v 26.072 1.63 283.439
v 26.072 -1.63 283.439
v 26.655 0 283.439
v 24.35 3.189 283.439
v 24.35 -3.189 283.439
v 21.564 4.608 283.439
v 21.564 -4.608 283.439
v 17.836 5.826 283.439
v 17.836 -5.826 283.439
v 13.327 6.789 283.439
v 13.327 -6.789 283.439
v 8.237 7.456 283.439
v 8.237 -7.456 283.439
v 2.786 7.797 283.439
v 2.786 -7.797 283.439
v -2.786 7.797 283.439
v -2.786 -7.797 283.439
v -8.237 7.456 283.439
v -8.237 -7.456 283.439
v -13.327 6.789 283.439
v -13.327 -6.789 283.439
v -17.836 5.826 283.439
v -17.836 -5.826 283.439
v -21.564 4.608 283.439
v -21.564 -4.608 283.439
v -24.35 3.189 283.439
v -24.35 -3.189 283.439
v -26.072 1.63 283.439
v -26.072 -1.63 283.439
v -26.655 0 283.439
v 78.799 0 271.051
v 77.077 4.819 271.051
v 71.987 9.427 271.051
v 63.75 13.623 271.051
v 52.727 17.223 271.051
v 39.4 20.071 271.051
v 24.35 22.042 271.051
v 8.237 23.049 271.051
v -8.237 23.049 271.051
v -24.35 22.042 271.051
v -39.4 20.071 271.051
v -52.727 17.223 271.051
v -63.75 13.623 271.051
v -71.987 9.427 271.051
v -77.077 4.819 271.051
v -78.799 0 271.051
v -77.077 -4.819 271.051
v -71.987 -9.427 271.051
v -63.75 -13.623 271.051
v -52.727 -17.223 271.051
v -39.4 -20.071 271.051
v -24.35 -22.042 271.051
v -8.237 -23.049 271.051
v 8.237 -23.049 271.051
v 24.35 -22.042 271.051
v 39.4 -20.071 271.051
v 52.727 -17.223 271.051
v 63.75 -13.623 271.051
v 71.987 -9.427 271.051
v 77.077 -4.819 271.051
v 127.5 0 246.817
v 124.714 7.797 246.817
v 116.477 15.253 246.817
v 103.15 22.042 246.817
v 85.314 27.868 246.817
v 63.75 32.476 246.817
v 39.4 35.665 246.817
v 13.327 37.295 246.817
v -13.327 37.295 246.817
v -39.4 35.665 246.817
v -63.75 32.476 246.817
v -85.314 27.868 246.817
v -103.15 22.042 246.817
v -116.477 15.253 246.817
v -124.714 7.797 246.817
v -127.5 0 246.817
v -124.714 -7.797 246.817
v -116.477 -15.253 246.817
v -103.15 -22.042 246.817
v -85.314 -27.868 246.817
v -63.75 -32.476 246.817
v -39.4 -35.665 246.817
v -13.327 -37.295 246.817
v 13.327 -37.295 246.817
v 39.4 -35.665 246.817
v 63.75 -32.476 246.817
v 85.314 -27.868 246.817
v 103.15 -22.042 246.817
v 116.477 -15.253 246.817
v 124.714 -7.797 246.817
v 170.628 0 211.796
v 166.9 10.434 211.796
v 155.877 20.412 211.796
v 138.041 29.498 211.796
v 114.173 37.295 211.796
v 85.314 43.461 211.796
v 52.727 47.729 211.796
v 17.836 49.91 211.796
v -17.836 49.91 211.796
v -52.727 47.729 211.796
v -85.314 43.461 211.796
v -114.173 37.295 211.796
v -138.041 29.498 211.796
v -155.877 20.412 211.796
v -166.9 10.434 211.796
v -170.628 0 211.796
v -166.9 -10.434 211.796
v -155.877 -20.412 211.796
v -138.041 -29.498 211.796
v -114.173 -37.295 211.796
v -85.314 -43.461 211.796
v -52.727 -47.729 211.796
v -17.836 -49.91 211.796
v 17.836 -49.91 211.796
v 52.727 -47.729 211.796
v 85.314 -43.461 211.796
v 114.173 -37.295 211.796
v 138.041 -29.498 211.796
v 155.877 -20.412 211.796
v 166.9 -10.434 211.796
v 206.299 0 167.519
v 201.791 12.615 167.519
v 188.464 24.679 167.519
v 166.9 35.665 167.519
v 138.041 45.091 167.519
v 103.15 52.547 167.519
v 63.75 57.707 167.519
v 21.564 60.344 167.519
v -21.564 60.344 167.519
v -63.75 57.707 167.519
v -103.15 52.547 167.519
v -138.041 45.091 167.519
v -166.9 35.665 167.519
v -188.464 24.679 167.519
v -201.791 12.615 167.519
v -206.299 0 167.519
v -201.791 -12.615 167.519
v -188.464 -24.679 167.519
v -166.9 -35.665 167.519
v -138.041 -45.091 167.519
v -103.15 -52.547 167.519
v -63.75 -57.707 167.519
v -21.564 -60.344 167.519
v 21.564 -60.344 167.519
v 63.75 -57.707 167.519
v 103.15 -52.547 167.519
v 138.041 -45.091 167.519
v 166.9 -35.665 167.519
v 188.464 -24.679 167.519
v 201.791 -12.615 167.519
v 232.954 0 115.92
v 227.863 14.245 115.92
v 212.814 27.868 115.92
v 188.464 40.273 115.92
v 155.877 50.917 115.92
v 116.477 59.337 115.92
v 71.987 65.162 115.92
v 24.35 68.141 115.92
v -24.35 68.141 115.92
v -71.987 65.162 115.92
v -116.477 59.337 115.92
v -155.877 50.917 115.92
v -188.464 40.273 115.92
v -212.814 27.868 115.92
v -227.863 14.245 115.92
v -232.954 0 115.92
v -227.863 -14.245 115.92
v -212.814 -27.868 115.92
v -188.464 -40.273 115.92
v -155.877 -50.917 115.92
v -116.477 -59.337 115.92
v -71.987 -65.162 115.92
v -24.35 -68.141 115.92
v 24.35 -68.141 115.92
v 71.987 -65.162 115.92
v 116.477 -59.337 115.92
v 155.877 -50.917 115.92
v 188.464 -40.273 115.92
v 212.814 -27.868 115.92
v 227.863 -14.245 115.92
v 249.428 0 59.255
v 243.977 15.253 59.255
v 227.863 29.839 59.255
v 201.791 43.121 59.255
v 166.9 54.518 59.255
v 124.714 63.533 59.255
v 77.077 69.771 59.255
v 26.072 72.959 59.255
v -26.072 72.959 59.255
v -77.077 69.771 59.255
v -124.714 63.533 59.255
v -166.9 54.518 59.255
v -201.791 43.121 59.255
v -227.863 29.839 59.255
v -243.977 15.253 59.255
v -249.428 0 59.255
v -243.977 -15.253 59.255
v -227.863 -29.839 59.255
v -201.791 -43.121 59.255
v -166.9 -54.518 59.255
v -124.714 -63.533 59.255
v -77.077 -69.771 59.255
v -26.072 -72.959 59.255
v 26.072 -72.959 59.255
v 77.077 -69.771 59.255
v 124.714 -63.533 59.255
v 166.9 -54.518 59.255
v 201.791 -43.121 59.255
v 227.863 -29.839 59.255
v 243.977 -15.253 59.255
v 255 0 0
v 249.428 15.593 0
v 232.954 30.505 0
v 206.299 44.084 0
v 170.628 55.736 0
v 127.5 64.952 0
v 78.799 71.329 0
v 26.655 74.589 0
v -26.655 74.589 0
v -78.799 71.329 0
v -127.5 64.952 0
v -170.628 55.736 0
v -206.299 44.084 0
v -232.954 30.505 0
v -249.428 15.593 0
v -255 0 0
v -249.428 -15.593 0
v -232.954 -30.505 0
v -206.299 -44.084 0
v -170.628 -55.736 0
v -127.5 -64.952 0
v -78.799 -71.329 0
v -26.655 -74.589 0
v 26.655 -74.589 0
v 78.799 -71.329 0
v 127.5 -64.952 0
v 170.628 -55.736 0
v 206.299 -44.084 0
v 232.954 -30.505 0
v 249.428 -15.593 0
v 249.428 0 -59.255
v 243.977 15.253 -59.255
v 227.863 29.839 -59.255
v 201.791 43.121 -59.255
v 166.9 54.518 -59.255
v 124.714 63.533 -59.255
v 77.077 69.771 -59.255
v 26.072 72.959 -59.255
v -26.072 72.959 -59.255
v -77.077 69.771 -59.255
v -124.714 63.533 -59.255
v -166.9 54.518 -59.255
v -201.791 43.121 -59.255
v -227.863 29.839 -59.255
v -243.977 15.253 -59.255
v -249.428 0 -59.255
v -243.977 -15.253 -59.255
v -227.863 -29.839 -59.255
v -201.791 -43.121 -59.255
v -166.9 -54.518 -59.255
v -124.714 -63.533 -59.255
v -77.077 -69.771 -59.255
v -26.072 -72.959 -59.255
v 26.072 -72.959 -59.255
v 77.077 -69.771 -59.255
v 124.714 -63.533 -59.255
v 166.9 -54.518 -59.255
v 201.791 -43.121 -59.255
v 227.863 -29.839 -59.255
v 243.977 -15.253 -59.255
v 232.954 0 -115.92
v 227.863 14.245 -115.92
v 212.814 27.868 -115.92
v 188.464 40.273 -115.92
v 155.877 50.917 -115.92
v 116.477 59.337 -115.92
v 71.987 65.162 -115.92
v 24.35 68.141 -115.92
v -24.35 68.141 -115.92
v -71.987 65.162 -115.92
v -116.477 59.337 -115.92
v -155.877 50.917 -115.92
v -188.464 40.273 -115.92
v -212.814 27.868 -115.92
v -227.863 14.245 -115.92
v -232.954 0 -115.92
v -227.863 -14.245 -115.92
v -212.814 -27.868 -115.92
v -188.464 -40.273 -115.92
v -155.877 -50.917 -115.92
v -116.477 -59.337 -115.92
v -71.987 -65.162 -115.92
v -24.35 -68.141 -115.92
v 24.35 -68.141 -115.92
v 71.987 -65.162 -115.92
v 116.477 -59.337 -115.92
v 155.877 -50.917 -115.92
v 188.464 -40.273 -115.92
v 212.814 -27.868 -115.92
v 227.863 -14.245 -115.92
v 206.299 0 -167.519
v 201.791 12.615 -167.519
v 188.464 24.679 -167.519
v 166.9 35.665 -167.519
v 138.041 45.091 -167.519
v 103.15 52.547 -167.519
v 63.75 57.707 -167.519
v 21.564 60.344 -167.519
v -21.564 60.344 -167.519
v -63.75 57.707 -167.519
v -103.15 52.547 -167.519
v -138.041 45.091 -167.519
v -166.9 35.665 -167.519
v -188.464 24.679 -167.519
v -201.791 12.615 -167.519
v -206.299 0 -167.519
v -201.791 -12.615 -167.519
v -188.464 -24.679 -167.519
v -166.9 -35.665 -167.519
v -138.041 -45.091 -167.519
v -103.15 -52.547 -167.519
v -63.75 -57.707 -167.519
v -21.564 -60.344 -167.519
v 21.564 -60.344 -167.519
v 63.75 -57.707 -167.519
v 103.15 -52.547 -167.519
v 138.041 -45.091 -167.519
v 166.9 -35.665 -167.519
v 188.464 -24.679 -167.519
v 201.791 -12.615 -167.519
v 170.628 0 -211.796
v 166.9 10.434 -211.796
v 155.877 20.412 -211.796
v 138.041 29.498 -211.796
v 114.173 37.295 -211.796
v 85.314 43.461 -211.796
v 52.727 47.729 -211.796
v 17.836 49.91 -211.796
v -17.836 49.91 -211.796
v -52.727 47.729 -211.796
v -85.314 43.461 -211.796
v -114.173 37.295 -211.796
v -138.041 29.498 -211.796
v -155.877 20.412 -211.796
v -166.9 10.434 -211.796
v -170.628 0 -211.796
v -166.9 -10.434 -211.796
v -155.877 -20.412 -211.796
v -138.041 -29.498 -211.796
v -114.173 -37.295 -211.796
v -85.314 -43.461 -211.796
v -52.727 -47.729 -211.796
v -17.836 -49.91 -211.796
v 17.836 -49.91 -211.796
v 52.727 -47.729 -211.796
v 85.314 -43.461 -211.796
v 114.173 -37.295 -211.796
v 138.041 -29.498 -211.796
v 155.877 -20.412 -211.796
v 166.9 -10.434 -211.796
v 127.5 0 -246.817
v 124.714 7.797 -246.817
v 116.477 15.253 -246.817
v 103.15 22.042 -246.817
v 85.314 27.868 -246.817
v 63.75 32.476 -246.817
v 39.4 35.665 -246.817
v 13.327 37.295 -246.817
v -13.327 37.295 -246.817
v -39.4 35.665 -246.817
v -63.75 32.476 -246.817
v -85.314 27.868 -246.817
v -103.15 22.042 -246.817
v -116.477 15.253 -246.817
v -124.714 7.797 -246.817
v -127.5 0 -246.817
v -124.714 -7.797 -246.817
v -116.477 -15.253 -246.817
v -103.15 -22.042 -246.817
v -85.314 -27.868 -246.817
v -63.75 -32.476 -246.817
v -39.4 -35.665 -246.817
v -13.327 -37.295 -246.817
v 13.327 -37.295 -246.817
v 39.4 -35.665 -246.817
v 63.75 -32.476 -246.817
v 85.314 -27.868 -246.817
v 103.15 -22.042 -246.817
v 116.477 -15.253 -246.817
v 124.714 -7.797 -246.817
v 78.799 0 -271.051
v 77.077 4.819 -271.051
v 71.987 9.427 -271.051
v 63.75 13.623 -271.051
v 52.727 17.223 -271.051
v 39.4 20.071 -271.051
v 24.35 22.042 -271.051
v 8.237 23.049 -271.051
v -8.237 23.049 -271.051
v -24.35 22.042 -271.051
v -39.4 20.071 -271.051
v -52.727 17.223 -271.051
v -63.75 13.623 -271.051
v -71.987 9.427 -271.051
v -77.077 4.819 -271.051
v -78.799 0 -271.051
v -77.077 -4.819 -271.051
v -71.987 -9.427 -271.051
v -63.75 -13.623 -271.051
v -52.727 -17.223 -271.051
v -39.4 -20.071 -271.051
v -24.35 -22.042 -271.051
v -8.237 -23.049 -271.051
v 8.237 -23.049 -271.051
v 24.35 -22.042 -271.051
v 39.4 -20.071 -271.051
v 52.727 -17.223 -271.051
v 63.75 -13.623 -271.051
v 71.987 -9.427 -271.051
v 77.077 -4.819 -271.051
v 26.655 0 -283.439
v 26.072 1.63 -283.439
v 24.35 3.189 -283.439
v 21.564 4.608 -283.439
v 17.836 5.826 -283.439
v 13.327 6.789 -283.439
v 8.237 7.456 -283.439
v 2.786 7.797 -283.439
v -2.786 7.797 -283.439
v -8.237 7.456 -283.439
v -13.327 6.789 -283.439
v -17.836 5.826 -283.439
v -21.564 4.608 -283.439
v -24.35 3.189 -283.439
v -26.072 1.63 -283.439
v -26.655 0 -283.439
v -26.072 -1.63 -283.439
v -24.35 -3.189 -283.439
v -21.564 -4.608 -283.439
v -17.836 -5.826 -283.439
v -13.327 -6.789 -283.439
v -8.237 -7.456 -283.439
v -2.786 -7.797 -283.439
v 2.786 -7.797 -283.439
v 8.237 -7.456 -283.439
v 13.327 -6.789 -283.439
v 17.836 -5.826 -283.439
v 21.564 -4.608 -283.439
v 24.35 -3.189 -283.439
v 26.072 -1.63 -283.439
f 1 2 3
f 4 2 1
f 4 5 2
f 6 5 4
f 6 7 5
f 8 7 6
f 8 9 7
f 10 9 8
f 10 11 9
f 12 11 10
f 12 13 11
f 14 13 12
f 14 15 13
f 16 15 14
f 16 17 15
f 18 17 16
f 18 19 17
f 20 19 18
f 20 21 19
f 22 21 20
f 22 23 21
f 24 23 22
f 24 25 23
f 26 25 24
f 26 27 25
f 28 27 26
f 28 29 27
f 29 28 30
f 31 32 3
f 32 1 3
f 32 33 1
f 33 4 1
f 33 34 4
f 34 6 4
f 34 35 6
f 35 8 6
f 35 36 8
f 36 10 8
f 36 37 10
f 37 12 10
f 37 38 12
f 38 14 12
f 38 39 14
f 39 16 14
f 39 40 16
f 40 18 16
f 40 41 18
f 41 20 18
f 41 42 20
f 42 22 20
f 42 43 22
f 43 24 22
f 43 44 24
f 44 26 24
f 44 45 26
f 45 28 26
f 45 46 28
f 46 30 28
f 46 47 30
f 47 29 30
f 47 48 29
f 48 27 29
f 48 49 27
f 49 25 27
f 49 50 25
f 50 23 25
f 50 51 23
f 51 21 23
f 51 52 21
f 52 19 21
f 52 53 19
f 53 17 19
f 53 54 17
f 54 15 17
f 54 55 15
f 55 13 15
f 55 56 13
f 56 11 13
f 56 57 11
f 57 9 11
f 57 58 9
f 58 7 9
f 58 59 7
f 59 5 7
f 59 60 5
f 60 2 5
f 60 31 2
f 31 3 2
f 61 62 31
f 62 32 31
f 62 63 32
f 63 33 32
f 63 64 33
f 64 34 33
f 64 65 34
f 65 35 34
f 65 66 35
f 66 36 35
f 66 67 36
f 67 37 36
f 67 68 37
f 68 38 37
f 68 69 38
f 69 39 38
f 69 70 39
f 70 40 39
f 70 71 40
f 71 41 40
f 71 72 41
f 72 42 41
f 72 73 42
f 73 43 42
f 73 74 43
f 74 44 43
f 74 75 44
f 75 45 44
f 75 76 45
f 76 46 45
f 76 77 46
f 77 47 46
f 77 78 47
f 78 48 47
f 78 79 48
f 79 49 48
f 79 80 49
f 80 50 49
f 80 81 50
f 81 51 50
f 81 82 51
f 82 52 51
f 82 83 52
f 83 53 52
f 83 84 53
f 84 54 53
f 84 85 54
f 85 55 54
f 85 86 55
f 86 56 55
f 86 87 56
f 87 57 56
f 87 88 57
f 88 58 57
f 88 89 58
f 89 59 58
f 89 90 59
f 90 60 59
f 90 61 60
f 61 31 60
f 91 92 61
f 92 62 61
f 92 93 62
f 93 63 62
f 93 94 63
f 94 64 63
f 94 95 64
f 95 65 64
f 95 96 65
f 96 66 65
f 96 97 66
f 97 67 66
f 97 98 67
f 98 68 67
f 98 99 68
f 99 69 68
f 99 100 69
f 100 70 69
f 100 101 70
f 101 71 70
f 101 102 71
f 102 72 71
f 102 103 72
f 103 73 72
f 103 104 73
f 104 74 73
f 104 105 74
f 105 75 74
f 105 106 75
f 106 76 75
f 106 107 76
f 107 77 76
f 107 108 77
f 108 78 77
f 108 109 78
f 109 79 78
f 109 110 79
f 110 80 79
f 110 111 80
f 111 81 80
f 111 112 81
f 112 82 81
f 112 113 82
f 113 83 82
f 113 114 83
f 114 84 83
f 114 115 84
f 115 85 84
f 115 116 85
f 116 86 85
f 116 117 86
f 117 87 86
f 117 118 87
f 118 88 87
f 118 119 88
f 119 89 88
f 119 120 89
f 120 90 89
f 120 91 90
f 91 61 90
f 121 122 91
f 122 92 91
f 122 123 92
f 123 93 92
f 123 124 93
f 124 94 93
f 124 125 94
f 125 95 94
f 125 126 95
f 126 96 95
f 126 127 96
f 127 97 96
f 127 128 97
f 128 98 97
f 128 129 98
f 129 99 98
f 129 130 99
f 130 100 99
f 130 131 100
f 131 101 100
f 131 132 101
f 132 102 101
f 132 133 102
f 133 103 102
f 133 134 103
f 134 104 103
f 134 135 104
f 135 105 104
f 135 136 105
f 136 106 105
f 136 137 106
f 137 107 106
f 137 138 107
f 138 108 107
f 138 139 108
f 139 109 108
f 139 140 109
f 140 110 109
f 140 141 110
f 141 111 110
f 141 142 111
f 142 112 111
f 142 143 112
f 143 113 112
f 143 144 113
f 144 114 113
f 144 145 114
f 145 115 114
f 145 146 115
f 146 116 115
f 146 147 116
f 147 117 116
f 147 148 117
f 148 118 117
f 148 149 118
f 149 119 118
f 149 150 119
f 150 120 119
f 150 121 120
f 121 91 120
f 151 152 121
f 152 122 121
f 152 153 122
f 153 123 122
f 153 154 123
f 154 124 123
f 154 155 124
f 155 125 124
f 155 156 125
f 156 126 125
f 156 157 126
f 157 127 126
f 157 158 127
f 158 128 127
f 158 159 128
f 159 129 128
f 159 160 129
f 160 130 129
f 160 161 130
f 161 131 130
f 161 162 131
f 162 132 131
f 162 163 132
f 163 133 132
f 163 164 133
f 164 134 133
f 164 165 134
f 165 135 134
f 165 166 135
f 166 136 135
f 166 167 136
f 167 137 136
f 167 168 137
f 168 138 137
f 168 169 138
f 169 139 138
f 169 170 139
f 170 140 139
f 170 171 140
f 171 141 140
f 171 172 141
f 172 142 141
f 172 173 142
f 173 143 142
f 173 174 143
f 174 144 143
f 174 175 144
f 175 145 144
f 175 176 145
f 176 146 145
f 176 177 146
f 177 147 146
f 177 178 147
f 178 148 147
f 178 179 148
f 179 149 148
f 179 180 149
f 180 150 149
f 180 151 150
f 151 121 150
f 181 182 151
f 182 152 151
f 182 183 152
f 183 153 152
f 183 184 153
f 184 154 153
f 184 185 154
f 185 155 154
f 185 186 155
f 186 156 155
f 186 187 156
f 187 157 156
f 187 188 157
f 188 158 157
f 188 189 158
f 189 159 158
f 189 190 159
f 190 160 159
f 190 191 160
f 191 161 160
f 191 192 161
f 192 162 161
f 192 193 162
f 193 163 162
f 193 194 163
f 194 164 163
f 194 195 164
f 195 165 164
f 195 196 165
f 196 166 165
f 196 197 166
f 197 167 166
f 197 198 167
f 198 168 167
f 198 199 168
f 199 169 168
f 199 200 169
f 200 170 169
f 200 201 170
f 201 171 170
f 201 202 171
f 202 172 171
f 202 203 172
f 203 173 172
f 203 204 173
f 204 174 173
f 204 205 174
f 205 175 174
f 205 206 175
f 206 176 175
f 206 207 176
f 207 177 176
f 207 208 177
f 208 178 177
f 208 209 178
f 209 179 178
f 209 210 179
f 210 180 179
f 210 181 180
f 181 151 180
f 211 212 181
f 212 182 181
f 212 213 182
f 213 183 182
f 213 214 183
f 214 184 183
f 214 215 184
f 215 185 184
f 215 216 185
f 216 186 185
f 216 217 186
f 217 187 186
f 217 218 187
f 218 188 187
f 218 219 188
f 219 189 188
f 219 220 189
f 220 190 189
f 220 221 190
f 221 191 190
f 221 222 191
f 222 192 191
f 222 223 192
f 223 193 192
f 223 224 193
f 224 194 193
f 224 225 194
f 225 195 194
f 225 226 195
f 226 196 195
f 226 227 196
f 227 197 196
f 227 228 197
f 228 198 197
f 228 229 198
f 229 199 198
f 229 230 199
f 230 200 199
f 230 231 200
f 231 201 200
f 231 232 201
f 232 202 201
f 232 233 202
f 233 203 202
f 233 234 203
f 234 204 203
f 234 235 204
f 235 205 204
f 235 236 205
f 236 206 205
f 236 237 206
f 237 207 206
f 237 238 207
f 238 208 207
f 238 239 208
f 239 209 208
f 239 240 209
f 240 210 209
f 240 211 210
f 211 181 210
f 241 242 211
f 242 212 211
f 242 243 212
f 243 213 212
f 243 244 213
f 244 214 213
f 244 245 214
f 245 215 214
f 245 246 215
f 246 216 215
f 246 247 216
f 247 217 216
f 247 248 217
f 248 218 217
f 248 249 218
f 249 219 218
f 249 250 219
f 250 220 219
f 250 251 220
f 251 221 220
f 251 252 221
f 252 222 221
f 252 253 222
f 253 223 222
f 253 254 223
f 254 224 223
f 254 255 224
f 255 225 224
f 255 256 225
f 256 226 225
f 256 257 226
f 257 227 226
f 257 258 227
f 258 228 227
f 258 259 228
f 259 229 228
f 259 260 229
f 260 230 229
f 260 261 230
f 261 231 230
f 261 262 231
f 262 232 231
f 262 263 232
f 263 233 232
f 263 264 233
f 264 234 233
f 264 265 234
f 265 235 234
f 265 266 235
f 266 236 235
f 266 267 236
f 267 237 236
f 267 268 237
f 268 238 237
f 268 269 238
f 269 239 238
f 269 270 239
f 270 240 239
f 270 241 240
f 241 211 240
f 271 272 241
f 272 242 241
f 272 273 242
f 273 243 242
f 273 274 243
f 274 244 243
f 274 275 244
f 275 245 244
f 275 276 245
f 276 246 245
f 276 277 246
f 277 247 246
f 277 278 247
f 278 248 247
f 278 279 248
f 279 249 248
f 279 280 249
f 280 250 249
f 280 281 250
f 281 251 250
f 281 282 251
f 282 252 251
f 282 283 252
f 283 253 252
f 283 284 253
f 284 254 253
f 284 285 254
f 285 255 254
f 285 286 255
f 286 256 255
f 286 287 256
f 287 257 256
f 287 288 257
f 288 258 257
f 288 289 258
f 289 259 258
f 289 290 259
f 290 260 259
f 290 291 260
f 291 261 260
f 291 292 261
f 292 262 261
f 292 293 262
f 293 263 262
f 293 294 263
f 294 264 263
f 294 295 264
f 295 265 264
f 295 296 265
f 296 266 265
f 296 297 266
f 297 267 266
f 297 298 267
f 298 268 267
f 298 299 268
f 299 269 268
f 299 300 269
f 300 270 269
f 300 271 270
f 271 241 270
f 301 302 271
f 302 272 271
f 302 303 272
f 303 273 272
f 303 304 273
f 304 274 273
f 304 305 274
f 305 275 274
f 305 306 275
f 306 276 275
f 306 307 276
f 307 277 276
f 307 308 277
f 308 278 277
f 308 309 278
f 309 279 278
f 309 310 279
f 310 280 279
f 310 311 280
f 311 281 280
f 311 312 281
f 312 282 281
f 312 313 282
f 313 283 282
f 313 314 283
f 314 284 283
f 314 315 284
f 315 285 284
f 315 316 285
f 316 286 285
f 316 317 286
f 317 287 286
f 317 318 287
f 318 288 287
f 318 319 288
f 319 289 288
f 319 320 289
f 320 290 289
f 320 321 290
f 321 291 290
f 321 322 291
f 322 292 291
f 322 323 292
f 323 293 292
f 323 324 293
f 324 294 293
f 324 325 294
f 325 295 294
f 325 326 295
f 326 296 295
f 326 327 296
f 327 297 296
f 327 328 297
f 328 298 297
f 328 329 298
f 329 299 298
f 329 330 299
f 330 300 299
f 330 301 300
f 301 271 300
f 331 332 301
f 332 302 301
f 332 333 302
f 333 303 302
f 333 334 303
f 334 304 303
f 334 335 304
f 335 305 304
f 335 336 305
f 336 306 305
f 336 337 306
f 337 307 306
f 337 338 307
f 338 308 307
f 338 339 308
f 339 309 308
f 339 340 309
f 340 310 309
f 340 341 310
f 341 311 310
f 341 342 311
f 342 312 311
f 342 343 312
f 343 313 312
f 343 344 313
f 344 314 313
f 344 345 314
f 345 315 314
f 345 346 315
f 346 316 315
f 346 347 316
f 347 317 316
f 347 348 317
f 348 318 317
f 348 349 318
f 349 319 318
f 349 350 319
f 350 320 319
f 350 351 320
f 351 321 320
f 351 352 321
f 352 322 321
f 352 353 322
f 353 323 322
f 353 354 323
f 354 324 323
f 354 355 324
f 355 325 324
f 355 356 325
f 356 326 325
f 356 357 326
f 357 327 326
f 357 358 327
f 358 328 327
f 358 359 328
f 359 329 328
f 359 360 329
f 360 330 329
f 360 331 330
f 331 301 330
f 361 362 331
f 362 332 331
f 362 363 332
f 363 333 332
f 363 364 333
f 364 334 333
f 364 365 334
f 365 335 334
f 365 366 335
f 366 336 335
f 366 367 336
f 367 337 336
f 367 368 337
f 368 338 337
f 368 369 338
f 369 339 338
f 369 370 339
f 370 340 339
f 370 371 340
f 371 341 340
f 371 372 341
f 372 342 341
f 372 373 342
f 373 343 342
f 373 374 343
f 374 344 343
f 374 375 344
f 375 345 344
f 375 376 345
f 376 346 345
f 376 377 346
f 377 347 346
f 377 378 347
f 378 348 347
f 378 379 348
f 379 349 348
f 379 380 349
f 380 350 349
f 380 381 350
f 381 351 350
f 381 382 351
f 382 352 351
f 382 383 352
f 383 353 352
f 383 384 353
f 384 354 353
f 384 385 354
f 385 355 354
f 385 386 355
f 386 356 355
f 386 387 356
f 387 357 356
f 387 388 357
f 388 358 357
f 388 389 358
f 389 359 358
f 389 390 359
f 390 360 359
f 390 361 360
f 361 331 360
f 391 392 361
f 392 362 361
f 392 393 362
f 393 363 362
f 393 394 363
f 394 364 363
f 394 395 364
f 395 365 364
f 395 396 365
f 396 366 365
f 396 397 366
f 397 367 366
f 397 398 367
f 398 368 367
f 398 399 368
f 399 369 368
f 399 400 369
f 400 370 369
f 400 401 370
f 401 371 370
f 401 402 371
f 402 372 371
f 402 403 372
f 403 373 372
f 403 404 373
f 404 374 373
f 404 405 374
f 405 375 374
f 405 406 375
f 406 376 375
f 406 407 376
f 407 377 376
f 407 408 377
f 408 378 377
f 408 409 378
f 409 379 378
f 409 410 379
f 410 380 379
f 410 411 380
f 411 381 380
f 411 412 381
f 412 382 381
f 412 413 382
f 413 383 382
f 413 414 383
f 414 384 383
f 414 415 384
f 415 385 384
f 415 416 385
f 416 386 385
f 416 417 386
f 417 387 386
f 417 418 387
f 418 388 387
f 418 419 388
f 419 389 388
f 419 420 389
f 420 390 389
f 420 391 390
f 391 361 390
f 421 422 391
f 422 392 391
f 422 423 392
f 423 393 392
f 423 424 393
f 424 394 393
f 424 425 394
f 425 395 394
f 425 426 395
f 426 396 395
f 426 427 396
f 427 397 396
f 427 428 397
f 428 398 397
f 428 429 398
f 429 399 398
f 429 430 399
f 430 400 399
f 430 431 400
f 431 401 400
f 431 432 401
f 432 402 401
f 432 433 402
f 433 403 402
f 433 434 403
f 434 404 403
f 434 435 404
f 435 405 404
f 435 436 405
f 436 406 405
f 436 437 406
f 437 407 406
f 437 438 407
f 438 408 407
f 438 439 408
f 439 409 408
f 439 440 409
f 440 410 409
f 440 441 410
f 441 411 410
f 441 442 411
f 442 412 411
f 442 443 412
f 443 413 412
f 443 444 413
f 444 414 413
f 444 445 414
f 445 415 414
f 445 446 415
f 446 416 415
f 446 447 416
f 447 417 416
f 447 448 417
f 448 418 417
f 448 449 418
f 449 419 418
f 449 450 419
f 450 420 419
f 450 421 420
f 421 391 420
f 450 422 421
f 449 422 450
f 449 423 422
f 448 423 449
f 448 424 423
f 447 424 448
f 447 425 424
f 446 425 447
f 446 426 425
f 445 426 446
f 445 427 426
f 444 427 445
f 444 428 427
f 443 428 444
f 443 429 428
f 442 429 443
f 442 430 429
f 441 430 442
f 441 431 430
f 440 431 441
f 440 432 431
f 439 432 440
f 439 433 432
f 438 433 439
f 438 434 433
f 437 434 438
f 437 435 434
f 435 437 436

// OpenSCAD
// Generated by SolidPython 1.0.1 on 2020-07-29 00:46:52


scale(v = [17, 5, 19]) {
	sphere(r = 15);
}
/***********************************************
*********      SolidPython code:      **********
************************************************
 
# import packages: SolidPython
from solid import *
from solid.utils import *
from itertools import chain, combinations, permutations


class Resize:

    def __init__(self, scad_file):
        self.scad_file = scad_file
        #self.scad_file = import_scad(scad_file)
        # cone/cylinder param:
        self.r1 = 0
        self.r2 = 0
        self.h = 0
        # rectangular prism param:
        self.w = 0
        self.l = 0
        # ellipse param:
        self.r = 0

    # import OpenScad code (file name corresponds to shape)


    # classify shape + parameters
    def assign(self, param1, param2, param3):
        if self.scad_file == 'cone.scad':
            self.r1 = param1
            self.r2 = param2
            self.h = param3
        elif self.scad_file == 'cylinder.scad':
            self.r1 = param1
            self.r2 = param2
            self.h = param3
        elif self.scad_file == 'rectangularPrism.scad':
            self.h = param1
            self.l = param2
            self.w = param3
        else:
            self.r = param1
            self.h = param2

    # resize parameters
    def iterate(self):
        x = range(3, 20, 2)
        i = 1
        if self.scad_file == 'cone.scad':
            tempList = list(permutations(x, 2))
            for temp in tempList:
                param1 = temp[0]
                param2 = temp[1]
                filepath = 'produced_scad_files/' + 'cone' + str(param1) + '_' + str(param2) + '_' + '.scad'
                scad_render_to_file(cylinder(h=param1, r1=param2, r2=0), filepath)

        elif self.scad_file == 'cylinder.scad':
            tempList = list(permutations(x, 3))
            for temp in tempList:
                param1 = temp[0]
                param2 = temp[1]
                filepath = 'produced_scad_files/' + 'cylinder' + str(param1) + '_' + str(param2) + '_' + '.scad'
                scad_render_to_file(cylinder(h=param1, r1=param2, r2=param2), filepath)

        elif self.scad_file == 'rectangularPrism.scad':
            tempList = list(permutations(x, 3))
            for temp in tempList:
                param1 = temp[0]
                param2 = temp[1]
                param3 = temp[2]
                filepath = 'produced_scad_files/' + 'rectangularPrism' + str(param1) + '_' + str(param2) + '_' + str(
                    param3) + '.scad'
                scad_render_to_file(cube(size=(param1, param2, param3)), filepath)

        elif self.scad_file == 'ellipse.scad':
            tempList = list(permutations(x, 4))
            for temp in tempList:
                param1 = temp[0]
                param2 = temp[1]
                param3 = temp[2]
                param4 = temp[3]
                filepath = 'produced_scad_files/' + 'ellipse' + str(param1) + '_' + str(param2) + '_' + str(param3) + '_' + str(param4) + '.scad'
                scad_render_to_file(scale([param1, param2, param3])(sphere(r=param4)), filepath)

    def render_to_scadfile(self):
        scad_render_to_file(scad, 'example.scad') 
 
************************************************/
